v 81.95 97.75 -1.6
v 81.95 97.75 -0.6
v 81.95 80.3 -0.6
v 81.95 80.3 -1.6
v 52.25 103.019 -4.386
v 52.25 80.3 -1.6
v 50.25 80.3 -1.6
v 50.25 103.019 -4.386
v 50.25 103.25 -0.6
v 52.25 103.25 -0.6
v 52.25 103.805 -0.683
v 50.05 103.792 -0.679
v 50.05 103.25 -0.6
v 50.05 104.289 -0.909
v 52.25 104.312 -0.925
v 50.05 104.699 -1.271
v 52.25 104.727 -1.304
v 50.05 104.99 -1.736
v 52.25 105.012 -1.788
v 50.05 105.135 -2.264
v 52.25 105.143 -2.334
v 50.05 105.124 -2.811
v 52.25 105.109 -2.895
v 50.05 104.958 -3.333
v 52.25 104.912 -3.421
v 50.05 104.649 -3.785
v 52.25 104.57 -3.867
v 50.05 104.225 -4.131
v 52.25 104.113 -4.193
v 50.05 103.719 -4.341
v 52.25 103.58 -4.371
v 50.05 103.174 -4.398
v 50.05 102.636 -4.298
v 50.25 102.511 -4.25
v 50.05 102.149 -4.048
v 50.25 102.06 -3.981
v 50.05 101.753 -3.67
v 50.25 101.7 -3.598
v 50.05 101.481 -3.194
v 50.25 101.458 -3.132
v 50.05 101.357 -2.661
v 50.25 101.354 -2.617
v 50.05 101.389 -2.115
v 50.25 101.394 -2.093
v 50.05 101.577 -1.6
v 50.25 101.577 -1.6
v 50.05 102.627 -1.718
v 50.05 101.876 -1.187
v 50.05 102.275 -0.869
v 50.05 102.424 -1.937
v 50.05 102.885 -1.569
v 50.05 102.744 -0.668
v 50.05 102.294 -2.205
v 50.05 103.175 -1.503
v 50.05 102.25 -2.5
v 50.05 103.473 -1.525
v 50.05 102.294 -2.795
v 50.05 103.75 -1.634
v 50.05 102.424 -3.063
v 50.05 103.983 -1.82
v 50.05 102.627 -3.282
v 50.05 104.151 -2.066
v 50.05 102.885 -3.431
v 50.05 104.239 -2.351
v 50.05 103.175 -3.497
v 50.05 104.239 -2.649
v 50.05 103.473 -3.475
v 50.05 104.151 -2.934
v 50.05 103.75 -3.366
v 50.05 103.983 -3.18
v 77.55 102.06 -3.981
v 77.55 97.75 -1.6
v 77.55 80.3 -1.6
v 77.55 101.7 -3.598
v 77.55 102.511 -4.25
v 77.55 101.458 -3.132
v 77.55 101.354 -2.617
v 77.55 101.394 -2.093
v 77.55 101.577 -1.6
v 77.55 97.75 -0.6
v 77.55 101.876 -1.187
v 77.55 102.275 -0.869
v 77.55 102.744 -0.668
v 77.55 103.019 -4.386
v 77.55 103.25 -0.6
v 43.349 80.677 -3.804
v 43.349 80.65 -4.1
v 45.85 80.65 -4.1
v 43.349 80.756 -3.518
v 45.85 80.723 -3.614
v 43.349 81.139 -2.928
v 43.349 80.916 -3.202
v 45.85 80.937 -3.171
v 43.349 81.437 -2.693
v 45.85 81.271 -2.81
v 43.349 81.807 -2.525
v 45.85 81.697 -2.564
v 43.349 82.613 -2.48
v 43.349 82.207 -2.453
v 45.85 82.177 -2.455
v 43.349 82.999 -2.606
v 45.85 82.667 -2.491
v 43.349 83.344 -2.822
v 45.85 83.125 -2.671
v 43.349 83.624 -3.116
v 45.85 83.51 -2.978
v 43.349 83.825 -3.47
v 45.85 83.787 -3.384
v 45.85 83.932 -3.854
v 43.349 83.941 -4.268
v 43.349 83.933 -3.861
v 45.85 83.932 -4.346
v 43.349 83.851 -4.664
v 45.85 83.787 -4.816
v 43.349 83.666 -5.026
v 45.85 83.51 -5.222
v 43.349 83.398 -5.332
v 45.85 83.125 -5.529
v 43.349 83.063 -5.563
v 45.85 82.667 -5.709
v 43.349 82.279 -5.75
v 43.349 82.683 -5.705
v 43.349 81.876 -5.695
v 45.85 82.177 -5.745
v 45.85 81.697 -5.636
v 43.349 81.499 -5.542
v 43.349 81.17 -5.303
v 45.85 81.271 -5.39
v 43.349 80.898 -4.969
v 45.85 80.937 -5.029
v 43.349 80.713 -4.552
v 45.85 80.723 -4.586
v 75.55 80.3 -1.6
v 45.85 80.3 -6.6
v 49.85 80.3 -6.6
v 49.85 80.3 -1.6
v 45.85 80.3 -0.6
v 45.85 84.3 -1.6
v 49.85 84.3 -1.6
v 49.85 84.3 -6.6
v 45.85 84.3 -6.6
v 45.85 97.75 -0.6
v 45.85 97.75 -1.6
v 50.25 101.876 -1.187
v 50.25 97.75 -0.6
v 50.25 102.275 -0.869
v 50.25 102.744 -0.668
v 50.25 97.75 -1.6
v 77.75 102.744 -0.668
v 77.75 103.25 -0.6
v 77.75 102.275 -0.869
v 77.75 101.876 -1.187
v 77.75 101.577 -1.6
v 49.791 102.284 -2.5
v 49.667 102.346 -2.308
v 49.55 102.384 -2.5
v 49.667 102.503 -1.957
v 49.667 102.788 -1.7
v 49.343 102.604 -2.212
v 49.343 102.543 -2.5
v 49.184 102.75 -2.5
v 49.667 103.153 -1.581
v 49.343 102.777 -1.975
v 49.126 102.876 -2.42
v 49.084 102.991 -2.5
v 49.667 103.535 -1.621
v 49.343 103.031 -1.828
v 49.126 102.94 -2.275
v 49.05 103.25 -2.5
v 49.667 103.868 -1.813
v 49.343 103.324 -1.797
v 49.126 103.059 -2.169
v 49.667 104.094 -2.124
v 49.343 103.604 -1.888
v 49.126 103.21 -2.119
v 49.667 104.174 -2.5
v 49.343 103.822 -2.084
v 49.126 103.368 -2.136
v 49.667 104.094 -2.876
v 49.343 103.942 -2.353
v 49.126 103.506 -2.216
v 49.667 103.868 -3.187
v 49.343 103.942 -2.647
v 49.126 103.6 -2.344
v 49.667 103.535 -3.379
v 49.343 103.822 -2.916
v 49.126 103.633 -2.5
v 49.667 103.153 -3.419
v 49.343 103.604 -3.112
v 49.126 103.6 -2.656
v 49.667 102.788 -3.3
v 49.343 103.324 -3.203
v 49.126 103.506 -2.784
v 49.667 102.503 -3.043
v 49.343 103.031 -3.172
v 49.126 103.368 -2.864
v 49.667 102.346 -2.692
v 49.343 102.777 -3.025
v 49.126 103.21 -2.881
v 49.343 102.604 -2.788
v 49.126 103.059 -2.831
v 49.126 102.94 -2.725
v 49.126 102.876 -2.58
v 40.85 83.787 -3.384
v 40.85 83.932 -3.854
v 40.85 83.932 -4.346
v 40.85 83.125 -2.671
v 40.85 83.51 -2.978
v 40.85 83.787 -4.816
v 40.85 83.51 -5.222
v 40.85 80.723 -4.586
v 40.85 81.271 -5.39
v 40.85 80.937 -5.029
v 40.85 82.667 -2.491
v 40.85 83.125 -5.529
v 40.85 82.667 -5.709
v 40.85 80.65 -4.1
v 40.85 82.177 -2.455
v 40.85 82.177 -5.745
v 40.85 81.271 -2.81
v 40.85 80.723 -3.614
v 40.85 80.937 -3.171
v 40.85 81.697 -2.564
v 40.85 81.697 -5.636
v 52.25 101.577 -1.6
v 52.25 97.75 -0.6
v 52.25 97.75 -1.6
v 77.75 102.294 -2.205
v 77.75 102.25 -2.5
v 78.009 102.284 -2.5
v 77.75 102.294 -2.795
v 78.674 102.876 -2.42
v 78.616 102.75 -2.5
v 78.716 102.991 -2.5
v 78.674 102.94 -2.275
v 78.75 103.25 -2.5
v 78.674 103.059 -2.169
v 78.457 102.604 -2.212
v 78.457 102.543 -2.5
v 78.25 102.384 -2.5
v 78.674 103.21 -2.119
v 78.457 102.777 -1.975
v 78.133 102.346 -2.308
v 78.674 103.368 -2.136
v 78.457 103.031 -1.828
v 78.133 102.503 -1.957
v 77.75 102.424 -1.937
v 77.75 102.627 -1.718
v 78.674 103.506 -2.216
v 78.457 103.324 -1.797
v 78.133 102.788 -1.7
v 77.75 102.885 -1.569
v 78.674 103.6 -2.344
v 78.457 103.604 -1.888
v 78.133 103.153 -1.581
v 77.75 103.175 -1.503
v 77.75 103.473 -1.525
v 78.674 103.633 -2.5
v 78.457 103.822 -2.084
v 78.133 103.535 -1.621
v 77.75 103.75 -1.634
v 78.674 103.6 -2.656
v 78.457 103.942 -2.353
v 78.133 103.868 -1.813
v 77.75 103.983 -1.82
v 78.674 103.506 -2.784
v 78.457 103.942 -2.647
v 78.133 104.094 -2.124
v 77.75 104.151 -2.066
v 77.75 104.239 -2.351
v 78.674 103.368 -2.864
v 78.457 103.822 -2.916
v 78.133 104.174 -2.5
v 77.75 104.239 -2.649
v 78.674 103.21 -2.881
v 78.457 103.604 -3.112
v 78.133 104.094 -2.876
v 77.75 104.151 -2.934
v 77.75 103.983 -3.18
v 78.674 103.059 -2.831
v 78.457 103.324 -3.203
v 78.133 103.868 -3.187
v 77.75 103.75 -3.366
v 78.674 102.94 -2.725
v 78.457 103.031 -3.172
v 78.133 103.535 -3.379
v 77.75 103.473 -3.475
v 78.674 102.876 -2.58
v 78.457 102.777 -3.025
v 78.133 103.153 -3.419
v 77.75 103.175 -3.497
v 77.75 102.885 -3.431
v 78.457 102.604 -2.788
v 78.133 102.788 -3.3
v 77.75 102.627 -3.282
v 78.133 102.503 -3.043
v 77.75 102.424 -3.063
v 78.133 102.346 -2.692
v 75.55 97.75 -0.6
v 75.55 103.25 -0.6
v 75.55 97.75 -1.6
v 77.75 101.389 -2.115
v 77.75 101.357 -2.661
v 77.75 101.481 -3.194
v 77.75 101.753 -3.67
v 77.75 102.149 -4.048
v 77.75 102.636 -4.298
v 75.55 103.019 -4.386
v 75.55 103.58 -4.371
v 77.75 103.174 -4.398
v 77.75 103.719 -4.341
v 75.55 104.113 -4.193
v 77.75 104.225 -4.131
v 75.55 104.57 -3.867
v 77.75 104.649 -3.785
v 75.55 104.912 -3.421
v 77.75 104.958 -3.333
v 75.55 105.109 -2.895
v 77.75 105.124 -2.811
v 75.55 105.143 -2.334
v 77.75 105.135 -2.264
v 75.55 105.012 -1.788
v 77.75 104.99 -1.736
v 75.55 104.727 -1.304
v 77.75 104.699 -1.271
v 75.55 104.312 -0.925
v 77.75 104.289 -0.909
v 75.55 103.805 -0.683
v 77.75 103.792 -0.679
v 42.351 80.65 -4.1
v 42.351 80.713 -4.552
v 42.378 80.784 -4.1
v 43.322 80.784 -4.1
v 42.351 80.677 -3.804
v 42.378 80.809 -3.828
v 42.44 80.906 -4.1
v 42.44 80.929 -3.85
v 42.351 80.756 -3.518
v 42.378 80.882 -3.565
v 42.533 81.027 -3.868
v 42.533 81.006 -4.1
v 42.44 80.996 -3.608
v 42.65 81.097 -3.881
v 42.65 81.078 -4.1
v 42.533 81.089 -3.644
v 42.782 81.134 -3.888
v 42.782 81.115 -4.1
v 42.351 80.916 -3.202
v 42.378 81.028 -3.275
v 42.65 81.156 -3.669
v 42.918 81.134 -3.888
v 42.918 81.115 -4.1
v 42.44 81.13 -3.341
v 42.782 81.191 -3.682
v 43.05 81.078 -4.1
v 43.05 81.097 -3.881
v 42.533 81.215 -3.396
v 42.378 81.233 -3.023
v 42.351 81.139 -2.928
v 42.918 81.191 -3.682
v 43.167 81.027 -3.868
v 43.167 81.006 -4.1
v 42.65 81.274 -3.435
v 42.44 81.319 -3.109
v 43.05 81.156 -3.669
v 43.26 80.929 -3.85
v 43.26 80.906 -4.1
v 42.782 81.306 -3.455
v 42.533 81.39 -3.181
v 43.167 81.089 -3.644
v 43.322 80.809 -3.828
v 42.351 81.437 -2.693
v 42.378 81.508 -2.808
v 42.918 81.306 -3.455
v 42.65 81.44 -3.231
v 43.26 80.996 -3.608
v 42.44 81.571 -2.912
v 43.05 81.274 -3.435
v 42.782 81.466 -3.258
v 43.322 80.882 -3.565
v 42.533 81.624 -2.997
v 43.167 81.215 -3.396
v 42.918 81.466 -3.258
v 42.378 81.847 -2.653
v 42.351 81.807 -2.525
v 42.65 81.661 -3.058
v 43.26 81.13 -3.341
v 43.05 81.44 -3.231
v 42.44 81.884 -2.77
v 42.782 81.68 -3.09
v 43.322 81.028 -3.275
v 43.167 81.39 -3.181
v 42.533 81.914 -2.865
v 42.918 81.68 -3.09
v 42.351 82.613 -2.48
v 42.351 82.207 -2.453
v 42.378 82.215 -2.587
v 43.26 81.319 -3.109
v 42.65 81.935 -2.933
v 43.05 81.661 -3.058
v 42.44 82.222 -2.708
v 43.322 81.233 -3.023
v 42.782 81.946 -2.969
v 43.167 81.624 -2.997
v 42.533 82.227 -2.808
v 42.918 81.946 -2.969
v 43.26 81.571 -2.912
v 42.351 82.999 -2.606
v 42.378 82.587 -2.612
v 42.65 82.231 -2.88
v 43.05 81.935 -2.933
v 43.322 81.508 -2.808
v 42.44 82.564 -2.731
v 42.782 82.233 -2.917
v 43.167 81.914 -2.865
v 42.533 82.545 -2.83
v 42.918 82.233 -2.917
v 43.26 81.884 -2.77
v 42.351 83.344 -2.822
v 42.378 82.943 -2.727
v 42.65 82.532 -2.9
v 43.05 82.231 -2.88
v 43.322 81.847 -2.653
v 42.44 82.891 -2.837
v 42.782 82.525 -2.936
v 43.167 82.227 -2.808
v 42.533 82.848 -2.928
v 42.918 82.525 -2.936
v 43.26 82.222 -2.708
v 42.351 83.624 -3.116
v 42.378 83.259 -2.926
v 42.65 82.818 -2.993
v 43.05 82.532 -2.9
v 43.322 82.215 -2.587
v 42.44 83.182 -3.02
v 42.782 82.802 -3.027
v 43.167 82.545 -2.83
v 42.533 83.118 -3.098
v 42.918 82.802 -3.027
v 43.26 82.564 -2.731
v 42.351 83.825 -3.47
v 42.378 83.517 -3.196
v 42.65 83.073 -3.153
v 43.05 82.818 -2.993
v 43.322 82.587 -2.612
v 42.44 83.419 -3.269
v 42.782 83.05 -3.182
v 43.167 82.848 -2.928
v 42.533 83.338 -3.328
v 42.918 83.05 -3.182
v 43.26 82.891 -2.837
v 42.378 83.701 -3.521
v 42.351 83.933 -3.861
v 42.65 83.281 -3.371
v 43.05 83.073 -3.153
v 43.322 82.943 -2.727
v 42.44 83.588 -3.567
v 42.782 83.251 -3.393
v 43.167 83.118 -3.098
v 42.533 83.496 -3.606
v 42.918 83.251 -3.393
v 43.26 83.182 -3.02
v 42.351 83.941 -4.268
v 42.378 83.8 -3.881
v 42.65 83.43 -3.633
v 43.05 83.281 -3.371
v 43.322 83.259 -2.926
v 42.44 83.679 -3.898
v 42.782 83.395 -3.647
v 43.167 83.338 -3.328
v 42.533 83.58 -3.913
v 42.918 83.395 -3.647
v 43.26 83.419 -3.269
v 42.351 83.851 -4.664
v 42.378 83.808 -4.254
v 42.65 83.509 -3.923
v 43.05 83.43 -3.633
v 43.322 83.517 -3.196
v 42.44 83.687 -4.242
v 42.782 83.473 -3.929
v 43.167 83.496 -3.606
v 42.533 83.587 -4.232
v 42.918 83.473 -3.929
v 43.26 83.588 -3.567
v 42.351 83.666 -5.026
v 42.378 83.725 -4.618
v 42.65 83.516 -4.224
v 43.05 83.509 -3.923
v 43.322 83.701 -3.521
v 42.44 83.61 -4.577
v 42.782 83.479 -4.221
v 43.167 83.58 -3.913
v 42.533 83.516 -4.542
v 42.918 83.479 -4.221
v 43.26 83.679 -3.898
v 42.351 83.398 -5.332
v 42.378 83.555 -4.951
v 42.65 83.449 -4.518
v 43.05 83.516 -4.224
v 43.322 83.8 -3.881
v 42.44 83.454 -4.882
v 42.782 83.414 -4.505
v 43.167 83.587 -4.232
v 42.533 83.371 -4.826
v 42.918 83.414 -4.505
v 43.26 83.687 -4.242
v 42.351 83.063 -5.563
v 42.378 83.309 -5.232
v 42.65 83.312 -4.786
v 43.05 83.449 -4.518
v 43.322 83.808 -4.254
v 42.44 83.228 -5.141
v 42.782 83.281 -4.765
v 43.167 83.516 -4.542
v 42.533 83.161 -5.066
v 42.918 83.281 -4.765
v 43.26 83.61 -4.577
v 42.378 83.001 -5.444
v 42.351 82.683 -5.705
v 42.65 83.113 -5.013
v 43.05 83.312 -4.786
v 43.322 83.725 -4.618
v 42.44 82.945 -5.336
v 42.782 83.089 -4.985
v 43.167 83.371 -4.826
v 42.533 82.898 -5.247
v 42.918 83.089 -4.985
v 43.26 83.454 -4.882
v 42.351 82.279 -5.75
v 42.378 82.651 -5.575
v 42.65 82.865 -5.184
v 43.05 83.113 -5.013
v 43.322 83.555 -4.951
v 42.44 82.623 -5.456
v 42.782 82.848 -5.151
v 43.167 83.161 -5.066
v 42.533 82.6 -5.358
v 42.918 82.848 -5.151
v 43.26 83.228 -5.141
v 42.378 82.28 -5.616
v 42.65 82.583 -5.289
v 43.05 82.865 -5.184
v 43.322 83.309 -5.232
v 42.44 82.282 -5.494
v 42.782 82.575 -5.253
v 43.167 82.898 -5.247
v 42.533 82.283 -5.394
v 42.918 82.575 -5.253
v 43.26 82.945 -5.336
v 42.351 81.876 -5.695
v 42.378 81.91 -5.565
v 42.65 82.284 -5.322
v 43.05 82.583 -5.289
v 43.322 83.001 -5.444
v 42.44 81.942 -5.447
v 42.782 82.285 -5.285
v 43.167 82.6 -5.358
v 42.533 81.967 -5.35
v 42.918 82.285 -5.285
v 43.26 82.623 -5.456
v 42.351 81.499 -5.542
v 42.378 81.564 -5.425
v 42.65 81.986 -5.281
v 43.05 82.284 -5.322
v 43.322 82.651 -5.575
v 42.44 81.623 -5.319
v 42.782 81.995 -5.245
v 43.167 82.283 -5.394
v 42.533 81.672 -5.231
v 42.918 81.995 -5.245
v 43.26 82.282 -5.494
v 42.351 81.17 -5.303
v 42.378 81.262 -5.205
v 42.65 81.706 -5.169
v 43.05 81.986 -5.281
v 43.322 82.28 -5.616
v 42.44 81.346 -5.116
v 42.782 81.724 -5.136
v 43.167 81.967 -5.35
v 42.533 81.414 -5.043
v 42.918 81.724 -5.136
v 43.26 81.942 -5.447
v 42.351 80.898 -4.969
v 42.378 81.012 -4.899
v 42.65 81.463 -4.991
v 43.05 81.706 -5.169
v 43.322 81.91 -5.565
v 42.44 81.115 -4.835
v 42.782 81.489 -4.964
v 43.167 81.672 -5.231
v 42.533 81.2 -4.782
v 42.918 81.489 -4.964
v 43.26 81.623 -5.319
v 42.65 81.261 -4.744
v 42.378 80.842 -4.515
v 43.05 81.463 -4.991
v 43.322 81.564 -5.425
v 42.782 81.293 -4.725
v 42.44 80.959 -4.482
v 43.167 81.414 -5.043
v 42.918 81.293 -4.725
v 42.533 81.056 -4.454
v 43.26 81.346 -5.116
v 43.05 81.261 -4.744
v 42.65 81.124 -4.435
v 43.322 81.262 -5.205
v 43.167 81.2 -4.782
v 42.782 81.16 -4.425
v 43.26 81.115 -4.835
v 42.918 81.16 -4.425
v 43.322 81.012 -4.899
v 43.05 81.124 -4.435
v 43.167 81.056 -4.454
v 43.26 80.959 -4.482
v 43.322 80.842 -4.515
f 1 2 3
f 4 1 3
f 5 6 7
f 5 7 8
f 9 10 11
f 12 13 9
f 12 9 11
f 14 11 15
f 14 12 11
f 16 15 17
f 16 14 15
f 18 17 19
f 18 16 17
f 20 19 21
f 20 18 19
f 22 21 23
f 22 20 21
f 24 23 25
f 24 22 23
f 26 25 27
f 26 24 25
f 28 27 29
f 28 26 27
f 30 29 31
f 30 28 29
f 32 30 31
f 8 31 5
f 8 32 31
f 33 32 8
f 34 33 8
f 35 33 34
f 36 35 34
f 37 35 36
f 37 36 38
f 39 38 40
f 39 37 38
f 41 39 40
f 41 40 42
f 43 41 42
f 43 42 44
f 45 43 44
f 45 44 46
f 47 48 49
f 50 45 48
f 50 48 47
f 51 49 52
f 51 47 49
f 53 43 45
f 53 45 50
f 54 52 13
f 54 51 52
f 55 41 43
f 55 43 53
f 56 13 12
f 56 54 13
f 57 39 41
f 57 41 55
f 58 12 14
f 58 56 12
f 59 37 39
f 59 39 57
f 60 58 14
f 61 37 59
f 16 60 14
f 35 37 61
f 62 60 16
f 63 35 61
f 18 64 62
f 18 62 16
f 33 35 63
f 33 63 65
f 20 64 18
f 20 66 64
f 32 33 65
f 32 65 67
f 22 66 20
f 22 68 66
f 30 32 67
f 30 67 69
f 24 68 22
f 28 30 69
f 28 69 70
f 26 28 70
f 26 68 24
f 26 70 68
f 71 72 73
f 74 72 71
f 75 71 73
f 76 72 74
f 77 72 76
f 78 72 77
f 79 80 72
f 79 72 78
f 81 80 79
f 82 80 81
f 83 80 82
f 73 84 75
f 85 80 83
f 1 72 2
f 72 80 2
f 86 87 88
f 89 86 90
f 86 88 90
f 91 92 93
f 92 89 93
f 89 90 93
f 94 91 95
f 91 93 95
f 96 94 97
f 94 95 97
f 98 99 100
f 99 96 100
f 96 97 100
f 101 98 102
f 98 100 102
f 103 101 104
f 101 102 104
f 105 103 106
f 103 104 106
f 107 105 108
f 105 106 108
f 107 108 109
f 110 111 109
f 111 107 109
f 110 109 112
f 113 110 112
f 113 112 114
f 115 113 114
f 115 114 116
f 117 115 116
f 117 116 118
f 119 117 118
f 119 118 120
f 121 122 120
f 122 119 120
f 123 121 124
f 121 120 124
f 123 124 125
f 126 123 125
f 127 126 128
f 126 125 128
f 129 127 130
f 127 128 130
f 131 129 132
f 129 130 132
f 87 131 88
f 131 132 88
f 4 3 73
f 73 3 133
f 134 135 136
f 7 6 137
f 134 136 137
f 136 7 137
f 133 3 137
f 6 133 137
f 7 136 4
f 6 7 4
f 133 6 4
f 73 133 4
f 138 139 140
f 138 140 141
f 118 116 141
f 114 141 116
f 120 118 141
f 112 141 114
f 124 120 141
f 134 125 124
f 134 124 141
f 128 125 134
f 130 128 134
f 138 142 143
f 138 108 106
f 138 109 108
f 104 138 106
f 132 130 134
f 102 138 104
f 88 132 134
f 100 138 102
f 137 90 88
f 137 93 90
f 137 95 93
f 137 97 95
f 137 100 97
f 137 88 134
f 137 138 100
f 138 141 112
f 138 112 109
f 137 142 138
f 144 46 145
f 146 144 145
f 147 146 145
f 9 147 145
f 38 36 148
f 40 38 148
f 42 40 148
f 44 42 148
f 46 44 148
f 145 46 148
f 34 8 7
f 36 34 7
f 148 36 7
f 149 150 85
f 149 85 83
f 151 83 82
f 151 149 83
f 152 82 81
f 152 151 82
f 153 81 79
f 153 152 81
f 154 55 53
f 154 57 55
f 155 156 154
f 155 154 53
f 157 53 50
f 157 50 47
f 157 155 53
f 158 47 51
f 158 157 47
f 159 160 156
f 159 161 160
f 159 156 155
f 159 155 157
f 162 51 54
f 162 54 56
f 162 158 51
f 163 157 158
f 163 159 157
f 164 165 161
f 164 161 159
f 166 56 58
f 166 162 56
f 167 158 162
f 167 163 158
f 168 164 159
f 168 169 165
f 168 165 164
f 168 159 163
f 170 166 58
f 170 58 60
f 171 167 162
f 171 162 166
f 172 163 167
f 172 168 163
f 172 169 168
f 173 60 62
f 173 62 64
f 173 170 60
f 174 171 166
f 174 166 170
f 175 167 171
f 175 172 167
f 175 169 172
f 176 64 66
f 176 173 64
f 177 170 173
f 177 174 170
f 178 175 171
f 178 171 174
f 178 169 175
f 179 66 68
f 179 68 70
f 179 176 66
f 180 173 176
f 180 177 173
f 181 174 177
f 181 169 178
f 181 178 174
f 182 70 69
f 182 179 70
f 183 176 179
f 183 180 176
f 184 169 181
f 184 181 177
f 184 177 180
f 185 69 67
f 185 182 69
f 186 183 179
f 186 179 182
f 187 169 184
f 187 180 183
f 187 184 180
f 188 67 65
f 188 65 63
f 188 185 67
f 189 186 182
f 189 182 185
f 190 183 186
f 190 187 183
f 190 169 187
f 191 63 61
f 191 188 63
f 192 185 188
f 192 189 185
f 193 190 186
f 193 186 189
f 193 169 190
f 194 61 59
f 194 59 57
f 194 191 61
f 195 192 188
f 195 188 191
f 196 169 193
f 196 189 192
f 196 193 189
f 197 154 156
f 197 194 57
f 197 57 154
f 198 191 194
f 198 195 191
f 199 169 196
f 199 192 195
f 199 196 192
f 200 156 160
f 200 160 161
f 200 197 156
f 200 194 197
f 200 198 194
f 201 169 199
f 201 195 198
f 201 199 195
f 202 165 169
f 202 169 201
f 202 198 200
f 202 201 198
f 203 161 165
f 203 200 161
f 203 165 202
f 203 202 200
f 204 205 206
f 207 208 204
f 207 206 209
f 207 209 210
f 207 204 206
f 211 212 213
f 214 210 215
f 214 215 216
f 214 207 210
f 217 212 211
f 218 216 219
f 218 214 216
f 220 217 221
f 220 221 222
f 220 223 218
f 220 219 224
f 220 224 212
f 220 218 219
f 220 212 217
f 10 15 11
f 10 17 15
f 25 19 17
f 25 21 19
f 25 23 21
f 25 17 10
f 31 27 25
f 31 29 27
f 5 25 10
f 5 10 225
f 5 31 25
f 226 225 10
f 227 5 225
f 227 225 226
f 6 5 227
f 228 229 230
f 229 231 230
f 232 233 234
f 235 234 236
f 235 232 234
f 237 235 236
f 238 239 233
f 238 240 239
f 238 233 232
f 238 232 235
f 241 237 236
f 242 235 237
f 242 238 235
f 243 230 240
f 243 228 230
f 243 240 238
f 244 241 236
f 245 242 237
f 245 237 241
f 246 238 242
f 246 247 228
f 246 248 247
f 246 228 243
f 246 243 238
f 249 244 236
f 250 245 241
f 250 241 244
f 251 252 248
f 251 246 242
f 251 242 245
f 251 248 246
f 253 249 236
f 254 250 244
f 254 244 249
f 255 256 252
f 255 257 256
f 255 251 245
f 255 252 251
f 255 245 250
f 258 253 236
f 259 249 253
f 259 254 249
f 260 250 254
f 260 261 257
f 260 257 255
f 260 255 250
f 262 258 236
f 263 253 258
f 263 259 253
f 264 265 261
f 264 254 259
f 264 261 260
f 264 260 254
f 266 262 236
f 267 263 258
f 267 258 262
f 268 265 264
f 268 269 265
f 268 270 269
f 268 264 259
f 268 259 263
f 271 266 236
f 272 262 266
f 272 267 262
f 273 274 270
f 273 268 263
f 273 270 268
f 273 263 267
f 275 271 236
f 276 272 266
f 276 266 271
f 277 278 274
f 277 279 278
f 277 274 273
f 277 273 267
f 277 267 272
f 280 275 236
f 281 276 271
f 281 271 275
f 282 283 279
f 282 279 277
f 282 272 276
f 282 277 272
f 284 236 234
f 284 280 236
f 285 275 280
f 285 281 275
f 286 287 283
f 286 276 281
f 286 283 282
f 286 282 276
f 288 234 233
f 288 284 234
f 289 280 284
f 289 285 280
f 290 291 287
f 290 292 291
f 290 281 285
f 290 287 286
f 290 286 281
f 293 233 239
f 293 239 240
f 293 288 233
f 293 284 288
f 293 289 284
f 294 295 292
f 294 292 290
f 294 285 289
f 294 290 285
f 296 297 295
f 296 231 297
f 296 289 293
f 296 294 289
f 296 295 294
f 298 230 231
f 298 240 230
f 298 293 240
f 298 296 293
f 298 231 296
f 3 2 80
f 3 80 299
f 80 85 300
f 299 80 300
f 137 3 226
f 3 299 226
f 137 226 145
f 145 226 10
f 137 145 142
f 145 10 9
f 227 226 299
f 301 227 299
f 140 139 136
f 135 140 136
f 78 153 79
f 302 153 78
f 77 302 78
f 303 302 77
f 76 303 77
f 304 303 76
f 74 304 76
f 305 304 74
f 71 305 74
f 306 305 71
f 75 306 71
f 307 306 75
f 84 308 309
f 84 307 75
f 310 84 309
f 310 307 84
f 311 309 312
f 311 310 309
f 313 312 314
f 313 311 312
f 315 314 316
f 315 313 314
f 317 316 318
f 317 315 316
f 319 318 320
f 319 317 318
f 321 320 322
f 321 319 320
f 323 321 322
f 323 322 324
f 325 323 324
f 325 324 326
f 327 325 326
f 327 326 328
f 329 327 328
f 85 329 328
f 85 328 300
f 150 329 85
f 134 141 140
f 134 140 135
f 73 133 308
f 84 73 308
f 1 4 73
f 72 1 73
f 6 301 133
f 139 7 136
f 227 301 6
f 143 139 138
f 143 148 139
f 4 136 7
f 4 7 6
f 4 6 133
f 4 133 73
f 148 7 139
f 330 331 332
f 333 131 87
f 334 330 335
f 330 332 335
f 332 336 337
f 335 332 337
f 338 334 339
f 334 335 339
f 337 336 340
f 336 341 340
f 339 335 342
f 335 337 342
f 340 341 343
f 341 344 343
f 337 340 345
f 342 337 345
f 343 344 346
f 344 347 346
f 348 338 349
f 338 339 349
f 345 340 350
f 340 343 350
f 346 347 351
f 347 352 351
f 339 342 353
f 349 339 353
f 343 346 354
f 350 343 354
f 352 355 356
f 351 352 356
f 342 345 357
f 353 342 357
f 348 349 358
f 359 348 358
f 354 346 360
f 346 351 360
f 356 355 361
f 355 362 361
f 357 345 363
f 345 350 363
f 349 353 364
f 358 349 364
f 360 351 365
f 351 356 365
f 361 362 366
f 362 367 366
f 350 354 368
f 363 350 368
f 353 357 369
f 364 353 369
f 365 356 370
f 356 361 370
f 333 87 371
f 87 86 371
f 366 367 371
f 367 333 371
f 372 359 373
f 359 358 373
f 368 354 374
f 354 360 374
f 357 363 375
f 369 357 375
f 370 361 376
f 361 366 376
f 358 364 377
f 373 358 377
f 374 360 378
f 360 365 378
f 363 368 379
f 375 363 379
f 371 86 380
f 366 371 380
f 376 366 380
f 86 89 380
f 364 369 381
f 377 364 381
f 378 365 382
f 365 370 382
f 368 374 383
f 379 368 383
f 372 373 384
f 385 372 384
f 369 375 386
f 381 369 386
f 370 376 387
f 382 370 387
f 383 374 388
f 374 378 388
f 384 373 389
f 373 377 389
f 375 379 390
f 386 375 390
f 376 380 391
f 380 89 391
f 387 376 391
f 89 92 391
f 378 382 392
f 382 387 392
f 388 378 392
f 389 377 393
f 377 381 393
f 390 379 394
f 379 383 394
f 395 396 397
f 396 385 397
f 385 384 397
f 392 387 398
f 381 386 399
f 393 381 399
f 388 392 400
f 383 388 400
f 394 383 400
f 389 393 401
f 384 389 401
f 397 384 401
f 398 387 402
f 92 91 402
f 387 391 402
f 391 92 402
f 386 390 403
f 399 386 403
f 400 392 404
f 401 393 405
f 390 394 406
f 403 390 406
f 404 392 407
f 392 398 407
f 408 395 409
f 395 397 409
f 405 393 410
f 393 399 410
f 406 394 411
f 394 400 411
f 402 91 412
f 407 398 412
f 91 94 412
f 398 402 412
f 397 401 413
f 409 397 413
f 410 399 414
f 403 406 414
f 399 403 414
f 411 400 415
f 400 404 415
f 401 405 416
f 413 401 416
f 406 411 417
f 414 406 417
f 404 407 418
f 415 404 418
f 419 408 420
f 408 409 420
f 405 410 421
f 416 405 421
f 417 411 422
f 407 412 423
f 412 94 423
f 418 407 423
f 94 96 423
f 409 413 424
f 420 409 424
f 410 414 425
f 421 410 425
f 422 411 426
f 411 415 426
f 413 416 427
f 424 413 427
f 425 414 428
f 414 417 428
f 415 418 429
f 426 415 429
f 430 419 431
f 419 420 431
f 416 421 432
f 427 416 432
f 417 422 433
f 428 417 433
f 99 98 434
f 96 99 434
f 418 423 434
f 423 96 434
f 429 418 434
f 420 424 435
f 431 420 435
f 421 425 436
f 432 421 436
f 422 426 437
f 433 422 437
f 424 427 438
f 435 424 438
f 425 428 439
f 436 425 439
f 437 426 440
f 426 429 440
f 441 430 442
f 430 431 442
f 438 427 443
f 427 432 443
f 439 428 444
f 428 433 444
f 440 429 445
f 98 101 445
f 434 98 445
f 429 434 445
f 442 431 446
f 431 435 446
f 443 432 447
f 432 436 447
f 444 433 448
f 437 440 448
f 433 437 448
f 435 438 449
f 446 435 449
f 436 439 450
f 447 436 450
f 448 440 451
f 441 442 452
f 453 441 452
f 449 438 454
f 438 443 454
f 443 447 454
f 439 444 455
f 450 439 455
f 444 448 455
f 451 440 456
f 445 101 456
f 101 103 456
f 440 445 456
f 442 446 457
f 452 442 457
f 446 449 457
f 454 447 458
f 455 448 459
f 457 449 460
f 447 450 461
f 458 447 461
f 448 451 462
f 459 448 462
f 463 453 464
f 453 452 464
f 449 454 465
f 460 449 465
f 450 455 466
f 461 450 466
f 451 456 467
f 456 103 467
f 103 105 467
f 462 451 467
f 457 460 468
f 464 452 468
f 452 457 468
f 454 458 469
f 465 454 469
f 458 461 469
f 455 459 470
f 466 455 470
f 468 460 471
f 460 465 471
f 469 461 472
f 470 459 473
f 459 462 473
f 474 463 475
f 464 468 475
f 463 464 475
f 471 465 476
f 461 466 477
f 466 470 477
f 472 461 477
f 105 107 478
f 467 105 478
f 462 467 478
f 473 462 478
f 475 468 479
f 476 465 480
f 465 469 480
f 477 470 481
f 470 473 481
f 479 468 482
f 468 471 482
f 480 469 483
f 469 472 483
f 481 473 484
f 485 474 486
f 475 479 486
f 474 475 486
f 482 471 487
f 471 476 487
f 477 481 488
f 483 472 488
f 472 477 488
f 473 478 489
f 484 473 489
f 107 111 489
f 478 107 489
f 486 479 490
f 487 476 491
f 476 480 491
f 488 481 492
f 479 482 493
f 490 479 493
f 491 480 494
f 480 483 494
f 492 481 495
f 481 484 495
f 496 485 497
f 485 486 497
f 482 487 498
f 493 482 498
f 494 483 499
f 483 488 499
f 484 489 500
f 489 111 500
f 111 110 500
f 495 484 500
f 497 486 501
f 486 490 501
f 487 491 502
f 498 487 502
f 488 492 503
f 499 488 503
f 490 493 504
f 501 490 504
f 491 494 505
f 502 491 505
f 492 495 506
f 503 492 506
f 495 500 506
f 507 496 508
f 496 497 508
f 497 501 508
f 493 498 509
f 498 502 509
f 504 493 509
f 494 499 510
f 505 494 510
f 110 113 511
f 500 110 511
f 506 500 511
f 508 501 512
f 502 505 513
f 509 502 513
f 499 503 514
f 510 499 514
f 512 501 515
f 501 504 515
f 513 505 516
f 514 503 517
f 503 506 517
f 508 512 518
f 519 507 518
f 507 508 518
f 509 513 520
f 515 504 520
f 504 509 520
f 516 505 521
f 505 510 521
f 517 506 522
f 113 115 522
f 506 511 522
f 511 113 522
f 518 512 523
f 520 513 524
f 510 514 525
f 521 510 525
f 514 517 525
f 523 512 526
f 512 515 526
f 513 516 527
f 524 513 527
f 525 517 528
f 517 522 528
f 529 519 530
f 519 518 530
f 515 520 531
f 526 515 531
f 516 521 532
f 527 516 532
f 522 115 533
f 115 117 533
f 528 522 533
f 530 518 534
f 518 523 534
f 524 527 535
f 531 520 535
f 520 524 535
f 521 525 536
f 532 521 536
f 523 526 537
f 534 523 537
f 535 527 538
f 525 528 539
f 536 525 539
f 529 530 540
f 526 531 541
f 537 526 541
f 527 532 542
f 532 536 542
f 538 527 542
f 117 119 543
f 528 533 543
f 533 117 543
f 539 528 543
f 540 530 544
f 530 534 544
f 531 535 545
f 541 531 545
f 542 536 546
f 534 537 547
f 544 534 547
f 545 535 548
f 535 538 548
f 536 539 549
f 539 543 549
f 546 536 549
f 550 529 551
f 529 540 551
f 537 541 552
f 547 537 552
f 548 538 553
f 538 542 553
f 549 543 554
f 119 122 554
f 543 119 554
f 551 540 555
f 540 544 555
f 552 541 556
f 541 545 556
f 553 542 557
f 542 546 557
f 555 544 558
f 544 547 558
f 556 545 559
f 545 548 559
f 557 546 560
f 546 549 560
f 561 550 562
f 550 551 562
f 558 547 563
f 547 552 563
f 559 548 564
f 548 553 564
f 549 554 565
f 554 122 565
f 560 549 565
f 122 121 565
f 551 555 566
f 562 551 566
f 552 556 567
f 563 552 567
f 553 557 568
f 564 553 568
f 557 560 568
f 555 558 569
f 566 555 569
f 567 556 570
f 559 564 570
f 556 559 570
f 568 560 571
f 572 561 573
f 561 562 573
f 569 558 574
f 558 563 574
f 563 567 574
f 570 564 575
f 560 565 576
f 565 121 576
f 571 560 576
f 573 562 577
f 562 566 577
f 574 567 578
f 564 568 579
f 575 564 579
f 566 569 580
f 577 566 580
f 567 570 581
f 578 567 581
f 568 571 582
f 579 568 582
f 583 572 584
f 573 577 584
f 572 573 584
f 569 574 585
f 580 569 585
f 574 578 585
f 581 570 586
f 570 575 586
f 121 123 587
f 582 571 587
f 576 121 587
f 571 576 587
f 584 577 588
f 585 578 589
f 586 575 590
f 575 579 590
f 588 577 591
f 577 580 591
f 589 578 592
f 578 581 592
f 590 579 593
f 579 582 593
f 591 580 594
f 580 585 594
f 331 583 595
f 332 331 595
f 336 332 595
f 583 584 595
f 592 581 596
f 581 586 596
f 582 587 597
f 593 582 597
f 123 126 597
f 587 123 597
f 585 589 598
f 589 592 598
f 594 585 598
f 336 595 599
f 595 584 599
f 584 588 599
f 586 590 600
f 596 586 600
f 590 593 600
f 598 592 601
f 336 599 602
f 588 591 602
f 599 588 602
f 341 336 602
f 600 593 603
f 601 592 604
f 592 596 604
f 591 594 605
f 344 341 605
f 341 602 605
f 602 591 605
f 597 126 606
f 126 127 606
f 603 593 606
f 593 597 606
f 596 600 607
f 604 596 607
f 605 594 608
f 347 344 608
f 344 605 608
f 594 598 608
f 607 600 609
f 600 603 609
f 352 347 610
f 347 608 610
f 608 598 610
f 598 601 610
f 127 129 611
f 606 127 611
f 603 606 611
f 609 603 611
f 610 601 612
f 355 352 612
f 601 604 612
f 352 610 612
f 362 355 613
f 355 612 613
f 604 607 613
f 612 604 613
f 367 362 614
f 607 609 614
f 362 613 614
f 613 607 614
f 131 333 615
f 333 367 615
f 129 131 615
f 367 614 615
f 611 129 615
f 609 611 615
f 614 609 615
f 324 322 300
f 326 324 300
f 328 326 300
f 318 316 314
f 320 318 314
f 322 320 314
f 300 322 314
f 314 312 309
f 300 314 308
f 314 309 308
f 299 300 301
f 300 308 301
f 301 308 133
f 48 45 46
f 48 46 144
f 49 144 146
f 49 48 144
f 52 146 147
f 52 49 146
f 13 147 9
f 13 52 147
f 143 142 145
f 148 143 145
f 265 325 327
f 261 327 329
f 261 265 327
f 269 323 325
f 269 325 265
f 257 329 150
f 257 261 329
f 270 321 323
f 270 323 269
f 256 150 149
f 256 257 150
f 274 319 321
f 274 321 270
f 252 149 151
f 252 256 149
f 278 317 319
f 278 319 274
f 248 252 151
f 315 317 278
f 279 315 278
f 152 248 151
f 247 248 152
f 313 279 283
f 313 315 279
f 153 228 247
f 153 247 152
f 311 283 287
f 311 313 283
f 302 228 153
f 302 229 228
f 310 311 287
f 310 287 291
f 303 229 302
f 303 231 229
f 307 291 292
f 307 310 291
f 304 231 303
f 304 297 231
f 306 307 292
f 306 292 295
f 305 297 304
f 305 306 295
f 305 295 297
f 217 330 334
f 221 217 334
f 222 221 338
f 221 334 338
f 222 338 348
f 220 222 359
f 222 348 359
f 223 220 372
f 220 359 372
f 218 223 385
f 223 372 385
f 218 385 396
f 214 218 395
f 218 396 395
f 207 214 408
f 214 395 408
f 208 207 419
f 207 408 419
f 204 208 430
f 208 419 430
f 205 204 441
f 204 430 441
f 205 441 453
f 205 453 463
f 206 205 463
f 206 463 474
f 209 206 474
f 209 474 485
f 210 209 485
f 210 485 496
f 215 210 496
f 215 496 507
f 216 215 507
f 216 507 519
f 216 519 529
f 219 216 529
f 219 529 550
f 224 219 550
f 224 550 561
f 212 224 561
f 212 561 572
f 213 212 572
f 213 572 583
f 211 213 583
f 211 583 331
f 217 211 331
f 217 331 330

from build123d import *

# Parameters (mm, degrees)
PAD038_DEPTH             = 1
PAD039_DEPTH             = 2.2
POCKET022_DEPTH          = 0.2
PAD040_DEPTH             = 2.2
POCKET023_DEPTH          = 0.2
SKETCH063_W              = 4
SKETCH063_H              = 4
PAD041_DEPTH             = 5
SKETCH064_R              = 1.65
PAD042_DEPTH             = 5
SKETCH065_R              = 0.5
PAD084_DEPTH             = 2
PAD085_DEPTH             = 2
CLONE003_PLACEMENT_ANGLE = 180


with BuildPart() as part:
    # Sketch058 (on DatumPlane) → Pad038 (new body)
    with BuildSketch(Plane(origin=(0, 0, -0.6), x_dir=(1, 0, 0), z_dir=(0, 0, -1))):
        Polygon((45.85, -61.65), (45.85, -79.1), (81.95, -79.1), (81.95, -61.65), (77.55, -61.65), (77.55, -58.65), (77.75, -58.65), (77.75, -56.15), (75.55, -56.15), (75.55, -61.65), (52.25, -61.65), (52.25, -56.15), (50.05, -56.15), (50.05, -58.65), (50.25, -58.65), (50.25, -61.65), align=None)
    extrude(amount=PAD038_DEPTH)

    # Sketch059 (on Face13 of Pad038) → Pad039 (join)
    with BuildSketch(Plane(origin=(50.05, 0, -0.6), x_dir=(0, 1, 0), z_dir=(-1, 0, 0))):
        with BuildLine():
            ThreePointArc((57.82332, 1), (55.175321, 3.530951), (56.15, 0))
            Line((56.15, 1), (56.15, 0))
            Line((57.82332, 1), (56.15, 1))
        make_face()
    extrude(amount=-PAD039_DEPTH)

    # Sketch060 (on Face18 of Pad039) → Pocket022 (cut)
    with BuildSketch(Plane(origin=(50.05, 0, -0.6), x_dir=(0, 1, 0), z_dir=(-1, 0, 0))):
        with BuildLine():
            ThreePointArc((56.15, 0), (57.124679, 0.269049), (57.82332, 1))
            Line((57.82332, 1), (58.65, 1))
            Line((58.65, 1), (58.65, 0))
            Line((58.65, 0), (56.15, 0))
        make_face()
    extrude(amount=-POCKET022_DEPTH, mode=Mode.SUBTRACT)

    # Sketch061 (on Face10 of Pocket022) → Pad040 (join)
    with BuildSketch(Plane(origin=(77.75, 0, -0.6), x_dir=(0, -1, 0), z_dir=(1, 0, 0))):
        with BuildLine():
            ThreePointArc((-56.15, 0), (-55.175321, 3.530951), (-57.82332, 1))
            Line((-57.82332, 1), (-56.15, 1))
            Line((-56.15, 1), (-56.15, 0))
        make_face()
    extrude(amount=-PAD040_DEPTH)

    # Sketch062 (on Face16 of Pad040) → Pocket023 (cut)
    with BuildSketch(Plane(origin=(77.75, 0, -0.6), x_dir=(0, -1, 0), z_dir=(1, 0, 0))):
        with BuildLine():
            ThreePointArc((-57.82332, 1), (-57.124679, 0.269049), (-56.15, 0))
            Line((-58.65, 0), (-56.15, 0))
            Line((-58.65, 1), (-58.65, 0))
            Line((-57.82332, 1), (-58.65, 1))
        make_face()
    extrude(amount=-POCKET023_DEPTH, mode=Mode.SUBTRACT)

    # Sphere004 → Sphere004 (revolve)
    with BuildSketch(Plane(origin=(50.05, 56.15, -2.5), x_dir=(0, 1, 0), z_dir=(0, 0, -1))):
        with BuildLine():
            ThreePointArc((0, -1), (1, 0), (0, 1))
            Line((0, 1), (0, -1))
        make_face()
    revolve(axis=Axis((50.05, 56.15, -2.5), (1, 0, 0)))

    # Sphere005 → Sphere005 (revolve)
    with BuildSketch(Plane(origin=(77.75, 56.15, -2.5), x_dir=(0, 1, 0), z_dir=(0, 0, -1))):
        with BuildLine():
            ThreePointArc((0, -1), (1, 0), (0, 1))
            Line((0, 1), (0, -1))
        make_face()
    revolve(axis=Axis((77.75, 56.15, -2.5), (1, 0, 0)))

    # Sketch063 (on Face5 of Sphere005) → Pad041 (join)
    with BuildSketch(Plane(origin=(77.75, 56.15, -1.6), x_dir=(0, 1, 0), z_dir=(0, 0, -1))):
        with Locations((20.95, 2.2)):
            Rectangle(SKETCH063_W, SKETCH063_H)
    extrude(amount=PAD041_DEPTH)

    # Sketch064 (on Face21 of Pad041) → Pad042 (join)
    with BuildSketch(Plane(origin=(81.95, 56.15, -2.5), x_dir=(0, 1, 0), z_dir=(1, 0, 0))):
        with Locations((20.95, -1.599996)):
            Circle(SKETCH064_R)
    extrude(amount=PAD042_DEPTH)

    # Sketch065 (on DatumPlane) → Groove002 (revolve, cut)
    with BuildSketch(Plane(origin=(84.45, 77.1, -4.1), x_dir=(0, 1, 0), z_dir=(0, 0, -1))):
        with Locations((1.680544, 0.5)):
            Circle(SKETCH065_R)
    revolve(axis=Axis((84.45, 77.1, -4.1), (1, 0, 0)), mode=Mode.SUBTRACT)

    # Sketch107 (on Face15 of Groove002) → Pad084 (join)
    with BuildSketch(Plane(origin=(52.25, 56.15, -2.5), x_dir=(0, 1, 0), z_dir=(1, 0, 0))):
        Polygon((22.95, 0.900005), (0.231255, -1.885874), (1.67332, 0.9), align=None)
    extrude(amount=-PAD084_DEPTH)

    # Sketch108 (on Face14 of Pad084) → Pad085 (join)
    with BuildSketch(Plane(origin=(75.55, 56.15, -2.5), x_dir=(0, 1, 0), z_dir=(-1, 0, 0))):
        Polygon((1.67332, -0.9), (22.95, -0.900005), (0.231255, 1.885874), align=None)
    extrude(amount=-PAD085_DEPTH)


with BuildPart() as part_1:
    # Clone003 placement: moved
    add(part.part.moved(Location((91.8, 159.4, 0))).rotate(Axis((91.8, 159.4, 0), (0, 0, -1)), CLONE003_PLACEMENT_ANGLE))


with BuildPart() as part_2:
    # Body021 placement: moved
    add(part_1.part.moved(Location((36, 0, 0))))


solid = part_2.part
